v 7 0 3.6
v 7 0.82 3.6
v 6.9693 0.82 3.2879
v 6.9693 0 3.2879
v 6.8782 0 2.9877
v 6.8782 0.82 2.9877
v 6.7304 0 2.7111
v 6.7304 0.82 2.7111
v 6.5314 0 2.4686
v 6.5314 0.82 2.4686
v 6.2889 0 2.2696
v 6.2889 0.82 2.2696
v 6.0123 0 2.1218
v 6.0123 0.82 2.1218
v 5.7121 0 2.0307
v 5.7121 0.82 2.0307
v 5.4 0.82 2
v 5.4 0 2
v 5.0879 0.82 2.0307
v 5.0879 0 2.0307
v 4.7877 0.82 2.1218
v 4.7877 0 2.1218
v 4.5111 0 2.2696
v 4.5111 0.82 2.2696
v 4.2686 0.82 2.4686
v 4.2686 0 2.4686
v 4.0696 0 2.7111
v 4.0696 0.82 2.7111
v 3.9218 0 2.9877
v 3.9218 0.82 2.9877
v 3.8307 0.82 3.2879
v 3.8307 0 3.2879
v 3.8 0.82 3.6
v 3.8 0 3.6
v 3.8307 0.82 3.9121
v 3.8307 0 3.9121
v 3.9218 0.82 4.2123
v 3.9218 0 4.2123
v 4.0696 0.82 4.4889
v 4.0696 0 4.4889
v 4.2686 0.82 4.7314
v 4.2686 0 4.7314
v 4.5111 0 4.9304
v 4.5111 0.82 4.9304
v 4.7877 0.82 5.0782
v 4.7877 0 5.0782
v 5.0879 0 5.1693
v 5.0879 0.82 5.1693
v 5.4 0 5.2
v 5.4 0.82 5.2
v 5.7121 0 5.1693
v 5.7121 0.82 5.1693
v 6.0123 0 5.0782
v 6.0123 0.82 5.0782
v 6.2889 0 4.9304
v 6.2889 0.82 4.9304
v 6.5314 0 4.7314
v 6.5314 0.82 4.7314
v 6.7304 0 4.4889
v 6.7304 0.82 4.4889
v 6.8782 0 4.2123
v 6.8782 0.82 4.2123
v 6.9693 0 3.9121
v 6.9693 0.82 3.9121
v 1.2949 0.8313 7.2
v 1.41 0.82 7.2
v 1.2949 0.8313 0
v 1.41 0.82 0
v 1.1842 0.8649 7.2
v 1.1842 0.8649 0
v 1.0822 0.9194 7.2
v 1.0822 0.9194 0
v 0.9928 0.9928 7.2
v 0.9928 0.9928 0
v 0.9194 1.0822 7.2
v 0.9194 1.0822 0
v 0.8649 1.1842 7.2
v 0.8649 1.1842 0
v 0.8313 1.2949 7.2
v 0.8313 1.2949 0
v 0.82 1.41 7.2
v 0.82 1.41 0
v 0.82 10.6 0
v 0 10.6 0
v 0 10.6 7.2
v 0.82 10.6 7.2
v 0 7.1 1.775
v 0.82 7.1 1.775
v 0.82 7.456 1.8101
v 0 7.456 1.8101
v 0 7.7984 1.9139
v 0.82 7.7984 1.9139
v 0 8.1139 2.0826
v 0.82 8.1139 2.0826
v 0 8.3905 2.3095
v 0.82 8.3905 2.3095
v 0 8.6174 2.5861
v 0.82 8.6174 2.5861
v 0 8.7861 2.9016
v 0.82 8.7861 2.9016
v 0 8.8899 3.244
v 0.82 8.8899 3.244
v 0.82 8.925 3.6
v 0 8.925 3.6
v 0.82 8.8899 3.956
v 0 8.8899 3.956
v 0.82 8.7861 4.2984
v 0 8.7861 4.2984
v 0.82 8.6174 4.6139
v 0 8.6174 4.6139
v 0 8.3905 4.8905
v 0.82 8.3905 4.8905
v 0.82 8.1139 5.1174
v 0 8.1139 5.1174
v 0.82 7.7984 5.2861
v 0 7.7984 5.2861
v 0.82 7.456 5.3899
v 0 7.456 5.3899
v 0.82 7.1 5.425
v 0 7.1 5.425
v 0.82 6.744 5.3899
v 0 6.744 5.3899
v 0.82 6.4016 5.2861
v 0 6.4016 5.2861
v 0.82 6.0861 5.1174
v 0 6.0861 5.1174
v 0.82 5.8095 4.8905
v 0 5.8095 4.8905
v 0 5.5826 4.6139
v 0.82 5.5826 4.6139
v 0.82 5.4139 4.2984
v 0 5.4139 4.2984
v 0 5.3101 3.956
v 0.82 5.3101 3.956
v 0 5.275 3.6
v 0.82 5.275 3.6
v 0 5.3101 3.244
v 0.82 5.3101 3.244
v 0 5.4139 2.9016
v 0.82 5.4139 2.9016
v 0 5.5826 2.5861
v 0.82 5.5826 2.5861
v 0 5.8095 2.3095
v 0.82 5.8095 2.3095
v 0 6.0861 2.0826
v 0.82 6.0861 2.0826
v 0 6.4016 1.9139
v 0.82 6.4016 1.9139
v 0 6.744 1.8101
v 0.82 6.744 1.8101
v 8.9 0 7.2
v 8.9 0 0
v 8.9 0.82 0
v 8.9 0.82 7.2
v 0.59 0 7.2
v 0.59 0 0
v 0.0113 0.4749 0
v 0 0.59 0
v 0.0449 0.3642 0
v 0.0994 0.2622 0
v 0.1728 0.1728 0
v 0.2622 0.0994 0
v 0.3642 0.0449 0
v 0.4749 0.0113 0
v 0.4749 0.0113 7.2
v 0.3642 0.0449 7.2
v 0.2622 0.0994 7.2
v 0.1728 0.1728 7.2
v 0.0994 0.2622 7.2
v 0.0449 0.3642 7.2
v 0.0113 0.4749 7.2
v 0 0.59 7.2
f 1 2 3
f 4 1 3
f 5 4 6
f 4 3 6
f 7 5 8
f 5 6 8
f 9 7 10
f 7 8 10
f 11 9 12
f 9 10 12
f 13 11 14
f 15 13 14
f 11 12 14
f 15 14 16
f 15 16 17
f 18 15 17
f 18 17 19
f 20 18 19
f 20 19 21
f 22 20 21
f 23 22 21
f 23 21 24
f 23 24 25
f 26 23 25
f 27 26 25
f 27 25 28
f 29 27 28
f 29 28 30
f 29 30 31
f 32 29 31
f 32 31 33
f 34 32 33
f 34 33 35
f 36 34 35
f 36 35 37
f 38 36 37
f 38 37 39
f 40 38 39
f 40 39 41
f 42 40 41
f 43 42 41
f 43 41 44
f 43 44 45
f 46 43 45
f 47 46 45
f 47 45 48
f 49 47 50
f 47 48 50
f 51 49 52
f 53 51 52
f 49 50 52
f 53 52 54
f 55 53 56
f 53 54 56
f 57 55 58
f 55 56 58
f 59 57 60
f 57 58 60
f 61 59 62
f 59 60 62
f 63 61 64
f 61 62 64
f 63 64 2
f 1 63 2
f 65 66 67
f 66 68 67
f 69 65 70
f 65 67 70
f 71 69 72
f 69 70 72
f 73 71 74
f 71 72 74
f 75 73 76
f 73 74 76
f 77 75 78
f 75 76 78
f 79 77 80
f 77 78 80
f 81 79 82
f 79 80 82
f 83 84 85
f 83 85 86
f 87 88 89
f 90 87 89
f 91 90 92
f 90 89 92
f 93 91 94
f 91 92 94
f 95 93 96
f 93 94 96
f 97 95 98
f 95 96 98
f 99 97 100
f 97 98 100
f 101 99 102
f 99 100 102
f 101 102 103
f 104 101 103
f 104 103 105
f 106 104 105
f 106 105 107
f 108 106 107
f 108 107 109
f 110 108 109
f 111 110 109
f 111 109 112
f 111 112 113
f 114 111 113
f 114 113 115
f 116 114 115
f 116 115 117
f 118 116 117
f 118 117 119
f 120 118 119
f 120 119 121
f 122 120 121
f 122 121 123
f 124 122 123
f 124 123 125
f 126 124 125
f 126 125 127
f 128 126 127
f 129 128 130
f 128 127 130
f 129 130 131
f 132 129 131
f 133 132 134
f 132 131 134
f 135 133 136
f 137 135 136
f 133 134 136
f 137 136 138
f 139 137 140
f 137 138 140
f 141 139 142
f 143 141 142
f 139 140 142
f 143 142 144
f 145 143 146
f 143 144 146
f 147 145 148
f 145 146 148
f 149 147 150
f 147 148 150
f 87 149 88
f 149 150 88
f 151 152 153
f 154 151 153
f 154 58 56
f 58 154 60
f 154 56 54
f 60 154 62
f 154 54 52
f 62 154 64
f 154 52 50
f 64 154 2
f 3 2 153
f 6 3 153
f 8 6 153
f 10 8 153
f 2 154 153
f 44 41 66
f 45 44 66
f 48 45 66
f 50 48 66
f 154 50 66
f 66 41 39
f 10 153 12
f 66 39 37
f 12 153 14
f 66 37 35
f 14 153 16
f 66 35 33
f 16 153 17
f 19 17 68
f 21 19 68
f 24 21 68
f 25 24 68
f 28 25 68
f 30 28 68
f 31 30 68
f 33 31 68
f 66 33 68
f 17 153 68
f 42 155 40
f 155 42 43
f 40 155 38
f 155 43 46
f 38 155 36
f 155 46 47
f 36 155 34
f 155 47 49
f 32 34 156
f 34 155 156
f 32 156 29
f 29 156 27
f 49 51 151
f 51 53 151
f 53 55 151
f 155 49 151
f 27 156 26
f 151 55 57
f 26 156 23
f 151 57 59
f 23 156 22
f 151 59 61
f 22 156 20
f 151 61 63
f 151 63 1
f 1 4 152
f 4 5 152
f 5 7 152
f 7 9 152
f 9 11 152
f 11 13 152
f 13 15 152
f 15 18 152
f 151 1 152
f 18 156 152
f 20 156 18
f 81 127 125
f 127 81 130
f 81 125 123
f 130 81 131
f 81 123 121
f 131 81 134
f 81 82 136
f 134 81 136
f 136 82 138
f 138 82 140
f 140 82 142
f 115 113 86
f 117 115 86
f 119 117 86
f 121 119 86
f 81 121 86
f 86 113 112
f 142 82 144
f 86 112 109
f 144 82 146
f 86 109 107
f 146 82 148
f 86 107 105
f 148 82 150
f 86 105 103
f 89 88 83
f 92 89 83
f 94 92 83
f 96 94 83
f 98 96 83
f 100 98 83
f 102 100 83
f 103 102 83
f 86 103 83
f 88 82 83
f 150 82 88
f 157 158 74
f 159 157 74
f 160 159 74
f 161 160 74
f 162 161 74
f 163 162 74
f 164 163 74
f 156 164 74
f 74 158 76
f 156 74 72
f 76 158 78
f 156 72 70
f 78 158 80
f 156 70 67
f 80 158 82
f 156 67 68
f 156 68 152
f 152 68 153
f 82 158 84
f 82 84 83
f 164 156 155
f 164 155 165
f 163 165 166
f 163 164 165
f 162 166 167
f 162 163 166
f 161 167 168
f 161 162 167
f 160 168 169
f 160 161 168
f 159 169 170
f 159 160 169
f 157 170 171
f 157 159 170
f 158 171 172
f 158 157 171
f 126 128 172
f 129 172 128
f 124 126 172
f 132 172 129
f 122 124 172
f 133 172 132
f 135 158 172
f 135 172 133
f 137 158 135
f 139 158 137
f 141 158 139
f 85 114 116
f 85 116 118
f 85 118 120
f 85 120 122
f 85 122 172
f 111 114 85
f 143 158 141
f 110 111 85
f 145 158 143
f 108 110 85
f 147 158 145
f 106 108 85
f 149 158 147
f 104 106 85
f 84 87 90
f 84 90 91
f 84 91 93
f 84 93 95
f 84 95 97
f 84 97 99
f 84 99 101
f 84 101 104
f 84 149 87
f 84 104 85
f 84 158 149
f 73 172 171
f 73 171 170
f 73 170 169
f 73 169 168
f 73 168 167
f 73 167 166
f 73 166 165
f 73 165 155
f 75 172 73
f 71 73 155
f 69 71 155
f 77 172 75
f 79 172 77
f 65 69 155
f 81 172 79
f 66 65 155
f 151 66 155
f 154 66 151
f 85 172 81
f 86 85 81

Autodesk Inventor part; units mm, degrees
ref_plane "YZ Plane" through (0, 0, 0) normal (1, 0, 0) x (0, 1, 0)
ref_plane "XZ Plane" through (0, 0, 0) normal (0, 1, 0) x (-1, 0, 0)
ref_plane "XY Plane" through (0, 0, 0) normal (0, 0, 1) x (1, 0, 0)
sketch "Sketch1" plane through (0, 0, 0) normal (0, 0, 1) x (1, 0, 0)
  line L0 (0, -2.2666) -> (0, 12.7444) projected
  line L1 (0, 10.6) -> (0, 0.59)
  line L2 (8.9, 0) -> (8.9, 0.82)
  line L3 (8.9, 0.82) -> (1.41, 0.82)
  line L4 (0.82, 1.41) -> (0.82, 10.6)
  line L5 (0, 10.6) -> (0.82, 10.6)
  line L6 (0.59, 0) -> (8.9, 0)
  arc A0 (0.82, 1.41) -> (1.41, 0.82) centre (1.41, 1.41) ccw
  arc A1 (0, 0.59) -> (0.59, 0) centre (0.59, 0.59) ccw
  point P0 (0, 0)
  dimension "d0" = 10.6
  dimension "d1" = 8.9
  dimension "d2" = 0.82
  dimension "d3" = 0.82
  dimension "d4" = 0.59
extrude "Extrusion1" add sketch "Sketch1" along normal blind 7.2
sketch "Sketch2" plane through (1.41, 0.82, 0) normal (0, 1, 0) x (1, 0, 0)
  line L0 (0, -7.2) -> (7.49, -7.2) projected
  circle A0 centre (3.99, -3.6) radius 1.6
  line L1 (7.49, 0) -> (7.49, -7.2) projected
  point P0 (-1.41, 0)
  dimension "d7" = 3.5
  dimension "d8" = 3.2
  dimension "d9" = 3.6
extrude "Extrusion2" cut sketch "Sketch2" against normal through all
sketch "Sketch3" plane through (0.82, 1.41, 0) normal (1, 0, 0) x (0, 0, -1)
  line L0 (0, 0) -> (0, 9.19) projected
  line L1 (0, 9.19) -> (-7.2, 9.19) projected
  circle A0 centre (-3.6, 5.69) radius 1.825
  point P0 (0, -1.41)
  dimension "d12" = 3.65
  dimension "d13" = 3.5
  dimension "d14" = 3.6
extrude "Extrusion3" cut sketch "Sketch3" against normal through all
properties part number "LCouplerSmall"
